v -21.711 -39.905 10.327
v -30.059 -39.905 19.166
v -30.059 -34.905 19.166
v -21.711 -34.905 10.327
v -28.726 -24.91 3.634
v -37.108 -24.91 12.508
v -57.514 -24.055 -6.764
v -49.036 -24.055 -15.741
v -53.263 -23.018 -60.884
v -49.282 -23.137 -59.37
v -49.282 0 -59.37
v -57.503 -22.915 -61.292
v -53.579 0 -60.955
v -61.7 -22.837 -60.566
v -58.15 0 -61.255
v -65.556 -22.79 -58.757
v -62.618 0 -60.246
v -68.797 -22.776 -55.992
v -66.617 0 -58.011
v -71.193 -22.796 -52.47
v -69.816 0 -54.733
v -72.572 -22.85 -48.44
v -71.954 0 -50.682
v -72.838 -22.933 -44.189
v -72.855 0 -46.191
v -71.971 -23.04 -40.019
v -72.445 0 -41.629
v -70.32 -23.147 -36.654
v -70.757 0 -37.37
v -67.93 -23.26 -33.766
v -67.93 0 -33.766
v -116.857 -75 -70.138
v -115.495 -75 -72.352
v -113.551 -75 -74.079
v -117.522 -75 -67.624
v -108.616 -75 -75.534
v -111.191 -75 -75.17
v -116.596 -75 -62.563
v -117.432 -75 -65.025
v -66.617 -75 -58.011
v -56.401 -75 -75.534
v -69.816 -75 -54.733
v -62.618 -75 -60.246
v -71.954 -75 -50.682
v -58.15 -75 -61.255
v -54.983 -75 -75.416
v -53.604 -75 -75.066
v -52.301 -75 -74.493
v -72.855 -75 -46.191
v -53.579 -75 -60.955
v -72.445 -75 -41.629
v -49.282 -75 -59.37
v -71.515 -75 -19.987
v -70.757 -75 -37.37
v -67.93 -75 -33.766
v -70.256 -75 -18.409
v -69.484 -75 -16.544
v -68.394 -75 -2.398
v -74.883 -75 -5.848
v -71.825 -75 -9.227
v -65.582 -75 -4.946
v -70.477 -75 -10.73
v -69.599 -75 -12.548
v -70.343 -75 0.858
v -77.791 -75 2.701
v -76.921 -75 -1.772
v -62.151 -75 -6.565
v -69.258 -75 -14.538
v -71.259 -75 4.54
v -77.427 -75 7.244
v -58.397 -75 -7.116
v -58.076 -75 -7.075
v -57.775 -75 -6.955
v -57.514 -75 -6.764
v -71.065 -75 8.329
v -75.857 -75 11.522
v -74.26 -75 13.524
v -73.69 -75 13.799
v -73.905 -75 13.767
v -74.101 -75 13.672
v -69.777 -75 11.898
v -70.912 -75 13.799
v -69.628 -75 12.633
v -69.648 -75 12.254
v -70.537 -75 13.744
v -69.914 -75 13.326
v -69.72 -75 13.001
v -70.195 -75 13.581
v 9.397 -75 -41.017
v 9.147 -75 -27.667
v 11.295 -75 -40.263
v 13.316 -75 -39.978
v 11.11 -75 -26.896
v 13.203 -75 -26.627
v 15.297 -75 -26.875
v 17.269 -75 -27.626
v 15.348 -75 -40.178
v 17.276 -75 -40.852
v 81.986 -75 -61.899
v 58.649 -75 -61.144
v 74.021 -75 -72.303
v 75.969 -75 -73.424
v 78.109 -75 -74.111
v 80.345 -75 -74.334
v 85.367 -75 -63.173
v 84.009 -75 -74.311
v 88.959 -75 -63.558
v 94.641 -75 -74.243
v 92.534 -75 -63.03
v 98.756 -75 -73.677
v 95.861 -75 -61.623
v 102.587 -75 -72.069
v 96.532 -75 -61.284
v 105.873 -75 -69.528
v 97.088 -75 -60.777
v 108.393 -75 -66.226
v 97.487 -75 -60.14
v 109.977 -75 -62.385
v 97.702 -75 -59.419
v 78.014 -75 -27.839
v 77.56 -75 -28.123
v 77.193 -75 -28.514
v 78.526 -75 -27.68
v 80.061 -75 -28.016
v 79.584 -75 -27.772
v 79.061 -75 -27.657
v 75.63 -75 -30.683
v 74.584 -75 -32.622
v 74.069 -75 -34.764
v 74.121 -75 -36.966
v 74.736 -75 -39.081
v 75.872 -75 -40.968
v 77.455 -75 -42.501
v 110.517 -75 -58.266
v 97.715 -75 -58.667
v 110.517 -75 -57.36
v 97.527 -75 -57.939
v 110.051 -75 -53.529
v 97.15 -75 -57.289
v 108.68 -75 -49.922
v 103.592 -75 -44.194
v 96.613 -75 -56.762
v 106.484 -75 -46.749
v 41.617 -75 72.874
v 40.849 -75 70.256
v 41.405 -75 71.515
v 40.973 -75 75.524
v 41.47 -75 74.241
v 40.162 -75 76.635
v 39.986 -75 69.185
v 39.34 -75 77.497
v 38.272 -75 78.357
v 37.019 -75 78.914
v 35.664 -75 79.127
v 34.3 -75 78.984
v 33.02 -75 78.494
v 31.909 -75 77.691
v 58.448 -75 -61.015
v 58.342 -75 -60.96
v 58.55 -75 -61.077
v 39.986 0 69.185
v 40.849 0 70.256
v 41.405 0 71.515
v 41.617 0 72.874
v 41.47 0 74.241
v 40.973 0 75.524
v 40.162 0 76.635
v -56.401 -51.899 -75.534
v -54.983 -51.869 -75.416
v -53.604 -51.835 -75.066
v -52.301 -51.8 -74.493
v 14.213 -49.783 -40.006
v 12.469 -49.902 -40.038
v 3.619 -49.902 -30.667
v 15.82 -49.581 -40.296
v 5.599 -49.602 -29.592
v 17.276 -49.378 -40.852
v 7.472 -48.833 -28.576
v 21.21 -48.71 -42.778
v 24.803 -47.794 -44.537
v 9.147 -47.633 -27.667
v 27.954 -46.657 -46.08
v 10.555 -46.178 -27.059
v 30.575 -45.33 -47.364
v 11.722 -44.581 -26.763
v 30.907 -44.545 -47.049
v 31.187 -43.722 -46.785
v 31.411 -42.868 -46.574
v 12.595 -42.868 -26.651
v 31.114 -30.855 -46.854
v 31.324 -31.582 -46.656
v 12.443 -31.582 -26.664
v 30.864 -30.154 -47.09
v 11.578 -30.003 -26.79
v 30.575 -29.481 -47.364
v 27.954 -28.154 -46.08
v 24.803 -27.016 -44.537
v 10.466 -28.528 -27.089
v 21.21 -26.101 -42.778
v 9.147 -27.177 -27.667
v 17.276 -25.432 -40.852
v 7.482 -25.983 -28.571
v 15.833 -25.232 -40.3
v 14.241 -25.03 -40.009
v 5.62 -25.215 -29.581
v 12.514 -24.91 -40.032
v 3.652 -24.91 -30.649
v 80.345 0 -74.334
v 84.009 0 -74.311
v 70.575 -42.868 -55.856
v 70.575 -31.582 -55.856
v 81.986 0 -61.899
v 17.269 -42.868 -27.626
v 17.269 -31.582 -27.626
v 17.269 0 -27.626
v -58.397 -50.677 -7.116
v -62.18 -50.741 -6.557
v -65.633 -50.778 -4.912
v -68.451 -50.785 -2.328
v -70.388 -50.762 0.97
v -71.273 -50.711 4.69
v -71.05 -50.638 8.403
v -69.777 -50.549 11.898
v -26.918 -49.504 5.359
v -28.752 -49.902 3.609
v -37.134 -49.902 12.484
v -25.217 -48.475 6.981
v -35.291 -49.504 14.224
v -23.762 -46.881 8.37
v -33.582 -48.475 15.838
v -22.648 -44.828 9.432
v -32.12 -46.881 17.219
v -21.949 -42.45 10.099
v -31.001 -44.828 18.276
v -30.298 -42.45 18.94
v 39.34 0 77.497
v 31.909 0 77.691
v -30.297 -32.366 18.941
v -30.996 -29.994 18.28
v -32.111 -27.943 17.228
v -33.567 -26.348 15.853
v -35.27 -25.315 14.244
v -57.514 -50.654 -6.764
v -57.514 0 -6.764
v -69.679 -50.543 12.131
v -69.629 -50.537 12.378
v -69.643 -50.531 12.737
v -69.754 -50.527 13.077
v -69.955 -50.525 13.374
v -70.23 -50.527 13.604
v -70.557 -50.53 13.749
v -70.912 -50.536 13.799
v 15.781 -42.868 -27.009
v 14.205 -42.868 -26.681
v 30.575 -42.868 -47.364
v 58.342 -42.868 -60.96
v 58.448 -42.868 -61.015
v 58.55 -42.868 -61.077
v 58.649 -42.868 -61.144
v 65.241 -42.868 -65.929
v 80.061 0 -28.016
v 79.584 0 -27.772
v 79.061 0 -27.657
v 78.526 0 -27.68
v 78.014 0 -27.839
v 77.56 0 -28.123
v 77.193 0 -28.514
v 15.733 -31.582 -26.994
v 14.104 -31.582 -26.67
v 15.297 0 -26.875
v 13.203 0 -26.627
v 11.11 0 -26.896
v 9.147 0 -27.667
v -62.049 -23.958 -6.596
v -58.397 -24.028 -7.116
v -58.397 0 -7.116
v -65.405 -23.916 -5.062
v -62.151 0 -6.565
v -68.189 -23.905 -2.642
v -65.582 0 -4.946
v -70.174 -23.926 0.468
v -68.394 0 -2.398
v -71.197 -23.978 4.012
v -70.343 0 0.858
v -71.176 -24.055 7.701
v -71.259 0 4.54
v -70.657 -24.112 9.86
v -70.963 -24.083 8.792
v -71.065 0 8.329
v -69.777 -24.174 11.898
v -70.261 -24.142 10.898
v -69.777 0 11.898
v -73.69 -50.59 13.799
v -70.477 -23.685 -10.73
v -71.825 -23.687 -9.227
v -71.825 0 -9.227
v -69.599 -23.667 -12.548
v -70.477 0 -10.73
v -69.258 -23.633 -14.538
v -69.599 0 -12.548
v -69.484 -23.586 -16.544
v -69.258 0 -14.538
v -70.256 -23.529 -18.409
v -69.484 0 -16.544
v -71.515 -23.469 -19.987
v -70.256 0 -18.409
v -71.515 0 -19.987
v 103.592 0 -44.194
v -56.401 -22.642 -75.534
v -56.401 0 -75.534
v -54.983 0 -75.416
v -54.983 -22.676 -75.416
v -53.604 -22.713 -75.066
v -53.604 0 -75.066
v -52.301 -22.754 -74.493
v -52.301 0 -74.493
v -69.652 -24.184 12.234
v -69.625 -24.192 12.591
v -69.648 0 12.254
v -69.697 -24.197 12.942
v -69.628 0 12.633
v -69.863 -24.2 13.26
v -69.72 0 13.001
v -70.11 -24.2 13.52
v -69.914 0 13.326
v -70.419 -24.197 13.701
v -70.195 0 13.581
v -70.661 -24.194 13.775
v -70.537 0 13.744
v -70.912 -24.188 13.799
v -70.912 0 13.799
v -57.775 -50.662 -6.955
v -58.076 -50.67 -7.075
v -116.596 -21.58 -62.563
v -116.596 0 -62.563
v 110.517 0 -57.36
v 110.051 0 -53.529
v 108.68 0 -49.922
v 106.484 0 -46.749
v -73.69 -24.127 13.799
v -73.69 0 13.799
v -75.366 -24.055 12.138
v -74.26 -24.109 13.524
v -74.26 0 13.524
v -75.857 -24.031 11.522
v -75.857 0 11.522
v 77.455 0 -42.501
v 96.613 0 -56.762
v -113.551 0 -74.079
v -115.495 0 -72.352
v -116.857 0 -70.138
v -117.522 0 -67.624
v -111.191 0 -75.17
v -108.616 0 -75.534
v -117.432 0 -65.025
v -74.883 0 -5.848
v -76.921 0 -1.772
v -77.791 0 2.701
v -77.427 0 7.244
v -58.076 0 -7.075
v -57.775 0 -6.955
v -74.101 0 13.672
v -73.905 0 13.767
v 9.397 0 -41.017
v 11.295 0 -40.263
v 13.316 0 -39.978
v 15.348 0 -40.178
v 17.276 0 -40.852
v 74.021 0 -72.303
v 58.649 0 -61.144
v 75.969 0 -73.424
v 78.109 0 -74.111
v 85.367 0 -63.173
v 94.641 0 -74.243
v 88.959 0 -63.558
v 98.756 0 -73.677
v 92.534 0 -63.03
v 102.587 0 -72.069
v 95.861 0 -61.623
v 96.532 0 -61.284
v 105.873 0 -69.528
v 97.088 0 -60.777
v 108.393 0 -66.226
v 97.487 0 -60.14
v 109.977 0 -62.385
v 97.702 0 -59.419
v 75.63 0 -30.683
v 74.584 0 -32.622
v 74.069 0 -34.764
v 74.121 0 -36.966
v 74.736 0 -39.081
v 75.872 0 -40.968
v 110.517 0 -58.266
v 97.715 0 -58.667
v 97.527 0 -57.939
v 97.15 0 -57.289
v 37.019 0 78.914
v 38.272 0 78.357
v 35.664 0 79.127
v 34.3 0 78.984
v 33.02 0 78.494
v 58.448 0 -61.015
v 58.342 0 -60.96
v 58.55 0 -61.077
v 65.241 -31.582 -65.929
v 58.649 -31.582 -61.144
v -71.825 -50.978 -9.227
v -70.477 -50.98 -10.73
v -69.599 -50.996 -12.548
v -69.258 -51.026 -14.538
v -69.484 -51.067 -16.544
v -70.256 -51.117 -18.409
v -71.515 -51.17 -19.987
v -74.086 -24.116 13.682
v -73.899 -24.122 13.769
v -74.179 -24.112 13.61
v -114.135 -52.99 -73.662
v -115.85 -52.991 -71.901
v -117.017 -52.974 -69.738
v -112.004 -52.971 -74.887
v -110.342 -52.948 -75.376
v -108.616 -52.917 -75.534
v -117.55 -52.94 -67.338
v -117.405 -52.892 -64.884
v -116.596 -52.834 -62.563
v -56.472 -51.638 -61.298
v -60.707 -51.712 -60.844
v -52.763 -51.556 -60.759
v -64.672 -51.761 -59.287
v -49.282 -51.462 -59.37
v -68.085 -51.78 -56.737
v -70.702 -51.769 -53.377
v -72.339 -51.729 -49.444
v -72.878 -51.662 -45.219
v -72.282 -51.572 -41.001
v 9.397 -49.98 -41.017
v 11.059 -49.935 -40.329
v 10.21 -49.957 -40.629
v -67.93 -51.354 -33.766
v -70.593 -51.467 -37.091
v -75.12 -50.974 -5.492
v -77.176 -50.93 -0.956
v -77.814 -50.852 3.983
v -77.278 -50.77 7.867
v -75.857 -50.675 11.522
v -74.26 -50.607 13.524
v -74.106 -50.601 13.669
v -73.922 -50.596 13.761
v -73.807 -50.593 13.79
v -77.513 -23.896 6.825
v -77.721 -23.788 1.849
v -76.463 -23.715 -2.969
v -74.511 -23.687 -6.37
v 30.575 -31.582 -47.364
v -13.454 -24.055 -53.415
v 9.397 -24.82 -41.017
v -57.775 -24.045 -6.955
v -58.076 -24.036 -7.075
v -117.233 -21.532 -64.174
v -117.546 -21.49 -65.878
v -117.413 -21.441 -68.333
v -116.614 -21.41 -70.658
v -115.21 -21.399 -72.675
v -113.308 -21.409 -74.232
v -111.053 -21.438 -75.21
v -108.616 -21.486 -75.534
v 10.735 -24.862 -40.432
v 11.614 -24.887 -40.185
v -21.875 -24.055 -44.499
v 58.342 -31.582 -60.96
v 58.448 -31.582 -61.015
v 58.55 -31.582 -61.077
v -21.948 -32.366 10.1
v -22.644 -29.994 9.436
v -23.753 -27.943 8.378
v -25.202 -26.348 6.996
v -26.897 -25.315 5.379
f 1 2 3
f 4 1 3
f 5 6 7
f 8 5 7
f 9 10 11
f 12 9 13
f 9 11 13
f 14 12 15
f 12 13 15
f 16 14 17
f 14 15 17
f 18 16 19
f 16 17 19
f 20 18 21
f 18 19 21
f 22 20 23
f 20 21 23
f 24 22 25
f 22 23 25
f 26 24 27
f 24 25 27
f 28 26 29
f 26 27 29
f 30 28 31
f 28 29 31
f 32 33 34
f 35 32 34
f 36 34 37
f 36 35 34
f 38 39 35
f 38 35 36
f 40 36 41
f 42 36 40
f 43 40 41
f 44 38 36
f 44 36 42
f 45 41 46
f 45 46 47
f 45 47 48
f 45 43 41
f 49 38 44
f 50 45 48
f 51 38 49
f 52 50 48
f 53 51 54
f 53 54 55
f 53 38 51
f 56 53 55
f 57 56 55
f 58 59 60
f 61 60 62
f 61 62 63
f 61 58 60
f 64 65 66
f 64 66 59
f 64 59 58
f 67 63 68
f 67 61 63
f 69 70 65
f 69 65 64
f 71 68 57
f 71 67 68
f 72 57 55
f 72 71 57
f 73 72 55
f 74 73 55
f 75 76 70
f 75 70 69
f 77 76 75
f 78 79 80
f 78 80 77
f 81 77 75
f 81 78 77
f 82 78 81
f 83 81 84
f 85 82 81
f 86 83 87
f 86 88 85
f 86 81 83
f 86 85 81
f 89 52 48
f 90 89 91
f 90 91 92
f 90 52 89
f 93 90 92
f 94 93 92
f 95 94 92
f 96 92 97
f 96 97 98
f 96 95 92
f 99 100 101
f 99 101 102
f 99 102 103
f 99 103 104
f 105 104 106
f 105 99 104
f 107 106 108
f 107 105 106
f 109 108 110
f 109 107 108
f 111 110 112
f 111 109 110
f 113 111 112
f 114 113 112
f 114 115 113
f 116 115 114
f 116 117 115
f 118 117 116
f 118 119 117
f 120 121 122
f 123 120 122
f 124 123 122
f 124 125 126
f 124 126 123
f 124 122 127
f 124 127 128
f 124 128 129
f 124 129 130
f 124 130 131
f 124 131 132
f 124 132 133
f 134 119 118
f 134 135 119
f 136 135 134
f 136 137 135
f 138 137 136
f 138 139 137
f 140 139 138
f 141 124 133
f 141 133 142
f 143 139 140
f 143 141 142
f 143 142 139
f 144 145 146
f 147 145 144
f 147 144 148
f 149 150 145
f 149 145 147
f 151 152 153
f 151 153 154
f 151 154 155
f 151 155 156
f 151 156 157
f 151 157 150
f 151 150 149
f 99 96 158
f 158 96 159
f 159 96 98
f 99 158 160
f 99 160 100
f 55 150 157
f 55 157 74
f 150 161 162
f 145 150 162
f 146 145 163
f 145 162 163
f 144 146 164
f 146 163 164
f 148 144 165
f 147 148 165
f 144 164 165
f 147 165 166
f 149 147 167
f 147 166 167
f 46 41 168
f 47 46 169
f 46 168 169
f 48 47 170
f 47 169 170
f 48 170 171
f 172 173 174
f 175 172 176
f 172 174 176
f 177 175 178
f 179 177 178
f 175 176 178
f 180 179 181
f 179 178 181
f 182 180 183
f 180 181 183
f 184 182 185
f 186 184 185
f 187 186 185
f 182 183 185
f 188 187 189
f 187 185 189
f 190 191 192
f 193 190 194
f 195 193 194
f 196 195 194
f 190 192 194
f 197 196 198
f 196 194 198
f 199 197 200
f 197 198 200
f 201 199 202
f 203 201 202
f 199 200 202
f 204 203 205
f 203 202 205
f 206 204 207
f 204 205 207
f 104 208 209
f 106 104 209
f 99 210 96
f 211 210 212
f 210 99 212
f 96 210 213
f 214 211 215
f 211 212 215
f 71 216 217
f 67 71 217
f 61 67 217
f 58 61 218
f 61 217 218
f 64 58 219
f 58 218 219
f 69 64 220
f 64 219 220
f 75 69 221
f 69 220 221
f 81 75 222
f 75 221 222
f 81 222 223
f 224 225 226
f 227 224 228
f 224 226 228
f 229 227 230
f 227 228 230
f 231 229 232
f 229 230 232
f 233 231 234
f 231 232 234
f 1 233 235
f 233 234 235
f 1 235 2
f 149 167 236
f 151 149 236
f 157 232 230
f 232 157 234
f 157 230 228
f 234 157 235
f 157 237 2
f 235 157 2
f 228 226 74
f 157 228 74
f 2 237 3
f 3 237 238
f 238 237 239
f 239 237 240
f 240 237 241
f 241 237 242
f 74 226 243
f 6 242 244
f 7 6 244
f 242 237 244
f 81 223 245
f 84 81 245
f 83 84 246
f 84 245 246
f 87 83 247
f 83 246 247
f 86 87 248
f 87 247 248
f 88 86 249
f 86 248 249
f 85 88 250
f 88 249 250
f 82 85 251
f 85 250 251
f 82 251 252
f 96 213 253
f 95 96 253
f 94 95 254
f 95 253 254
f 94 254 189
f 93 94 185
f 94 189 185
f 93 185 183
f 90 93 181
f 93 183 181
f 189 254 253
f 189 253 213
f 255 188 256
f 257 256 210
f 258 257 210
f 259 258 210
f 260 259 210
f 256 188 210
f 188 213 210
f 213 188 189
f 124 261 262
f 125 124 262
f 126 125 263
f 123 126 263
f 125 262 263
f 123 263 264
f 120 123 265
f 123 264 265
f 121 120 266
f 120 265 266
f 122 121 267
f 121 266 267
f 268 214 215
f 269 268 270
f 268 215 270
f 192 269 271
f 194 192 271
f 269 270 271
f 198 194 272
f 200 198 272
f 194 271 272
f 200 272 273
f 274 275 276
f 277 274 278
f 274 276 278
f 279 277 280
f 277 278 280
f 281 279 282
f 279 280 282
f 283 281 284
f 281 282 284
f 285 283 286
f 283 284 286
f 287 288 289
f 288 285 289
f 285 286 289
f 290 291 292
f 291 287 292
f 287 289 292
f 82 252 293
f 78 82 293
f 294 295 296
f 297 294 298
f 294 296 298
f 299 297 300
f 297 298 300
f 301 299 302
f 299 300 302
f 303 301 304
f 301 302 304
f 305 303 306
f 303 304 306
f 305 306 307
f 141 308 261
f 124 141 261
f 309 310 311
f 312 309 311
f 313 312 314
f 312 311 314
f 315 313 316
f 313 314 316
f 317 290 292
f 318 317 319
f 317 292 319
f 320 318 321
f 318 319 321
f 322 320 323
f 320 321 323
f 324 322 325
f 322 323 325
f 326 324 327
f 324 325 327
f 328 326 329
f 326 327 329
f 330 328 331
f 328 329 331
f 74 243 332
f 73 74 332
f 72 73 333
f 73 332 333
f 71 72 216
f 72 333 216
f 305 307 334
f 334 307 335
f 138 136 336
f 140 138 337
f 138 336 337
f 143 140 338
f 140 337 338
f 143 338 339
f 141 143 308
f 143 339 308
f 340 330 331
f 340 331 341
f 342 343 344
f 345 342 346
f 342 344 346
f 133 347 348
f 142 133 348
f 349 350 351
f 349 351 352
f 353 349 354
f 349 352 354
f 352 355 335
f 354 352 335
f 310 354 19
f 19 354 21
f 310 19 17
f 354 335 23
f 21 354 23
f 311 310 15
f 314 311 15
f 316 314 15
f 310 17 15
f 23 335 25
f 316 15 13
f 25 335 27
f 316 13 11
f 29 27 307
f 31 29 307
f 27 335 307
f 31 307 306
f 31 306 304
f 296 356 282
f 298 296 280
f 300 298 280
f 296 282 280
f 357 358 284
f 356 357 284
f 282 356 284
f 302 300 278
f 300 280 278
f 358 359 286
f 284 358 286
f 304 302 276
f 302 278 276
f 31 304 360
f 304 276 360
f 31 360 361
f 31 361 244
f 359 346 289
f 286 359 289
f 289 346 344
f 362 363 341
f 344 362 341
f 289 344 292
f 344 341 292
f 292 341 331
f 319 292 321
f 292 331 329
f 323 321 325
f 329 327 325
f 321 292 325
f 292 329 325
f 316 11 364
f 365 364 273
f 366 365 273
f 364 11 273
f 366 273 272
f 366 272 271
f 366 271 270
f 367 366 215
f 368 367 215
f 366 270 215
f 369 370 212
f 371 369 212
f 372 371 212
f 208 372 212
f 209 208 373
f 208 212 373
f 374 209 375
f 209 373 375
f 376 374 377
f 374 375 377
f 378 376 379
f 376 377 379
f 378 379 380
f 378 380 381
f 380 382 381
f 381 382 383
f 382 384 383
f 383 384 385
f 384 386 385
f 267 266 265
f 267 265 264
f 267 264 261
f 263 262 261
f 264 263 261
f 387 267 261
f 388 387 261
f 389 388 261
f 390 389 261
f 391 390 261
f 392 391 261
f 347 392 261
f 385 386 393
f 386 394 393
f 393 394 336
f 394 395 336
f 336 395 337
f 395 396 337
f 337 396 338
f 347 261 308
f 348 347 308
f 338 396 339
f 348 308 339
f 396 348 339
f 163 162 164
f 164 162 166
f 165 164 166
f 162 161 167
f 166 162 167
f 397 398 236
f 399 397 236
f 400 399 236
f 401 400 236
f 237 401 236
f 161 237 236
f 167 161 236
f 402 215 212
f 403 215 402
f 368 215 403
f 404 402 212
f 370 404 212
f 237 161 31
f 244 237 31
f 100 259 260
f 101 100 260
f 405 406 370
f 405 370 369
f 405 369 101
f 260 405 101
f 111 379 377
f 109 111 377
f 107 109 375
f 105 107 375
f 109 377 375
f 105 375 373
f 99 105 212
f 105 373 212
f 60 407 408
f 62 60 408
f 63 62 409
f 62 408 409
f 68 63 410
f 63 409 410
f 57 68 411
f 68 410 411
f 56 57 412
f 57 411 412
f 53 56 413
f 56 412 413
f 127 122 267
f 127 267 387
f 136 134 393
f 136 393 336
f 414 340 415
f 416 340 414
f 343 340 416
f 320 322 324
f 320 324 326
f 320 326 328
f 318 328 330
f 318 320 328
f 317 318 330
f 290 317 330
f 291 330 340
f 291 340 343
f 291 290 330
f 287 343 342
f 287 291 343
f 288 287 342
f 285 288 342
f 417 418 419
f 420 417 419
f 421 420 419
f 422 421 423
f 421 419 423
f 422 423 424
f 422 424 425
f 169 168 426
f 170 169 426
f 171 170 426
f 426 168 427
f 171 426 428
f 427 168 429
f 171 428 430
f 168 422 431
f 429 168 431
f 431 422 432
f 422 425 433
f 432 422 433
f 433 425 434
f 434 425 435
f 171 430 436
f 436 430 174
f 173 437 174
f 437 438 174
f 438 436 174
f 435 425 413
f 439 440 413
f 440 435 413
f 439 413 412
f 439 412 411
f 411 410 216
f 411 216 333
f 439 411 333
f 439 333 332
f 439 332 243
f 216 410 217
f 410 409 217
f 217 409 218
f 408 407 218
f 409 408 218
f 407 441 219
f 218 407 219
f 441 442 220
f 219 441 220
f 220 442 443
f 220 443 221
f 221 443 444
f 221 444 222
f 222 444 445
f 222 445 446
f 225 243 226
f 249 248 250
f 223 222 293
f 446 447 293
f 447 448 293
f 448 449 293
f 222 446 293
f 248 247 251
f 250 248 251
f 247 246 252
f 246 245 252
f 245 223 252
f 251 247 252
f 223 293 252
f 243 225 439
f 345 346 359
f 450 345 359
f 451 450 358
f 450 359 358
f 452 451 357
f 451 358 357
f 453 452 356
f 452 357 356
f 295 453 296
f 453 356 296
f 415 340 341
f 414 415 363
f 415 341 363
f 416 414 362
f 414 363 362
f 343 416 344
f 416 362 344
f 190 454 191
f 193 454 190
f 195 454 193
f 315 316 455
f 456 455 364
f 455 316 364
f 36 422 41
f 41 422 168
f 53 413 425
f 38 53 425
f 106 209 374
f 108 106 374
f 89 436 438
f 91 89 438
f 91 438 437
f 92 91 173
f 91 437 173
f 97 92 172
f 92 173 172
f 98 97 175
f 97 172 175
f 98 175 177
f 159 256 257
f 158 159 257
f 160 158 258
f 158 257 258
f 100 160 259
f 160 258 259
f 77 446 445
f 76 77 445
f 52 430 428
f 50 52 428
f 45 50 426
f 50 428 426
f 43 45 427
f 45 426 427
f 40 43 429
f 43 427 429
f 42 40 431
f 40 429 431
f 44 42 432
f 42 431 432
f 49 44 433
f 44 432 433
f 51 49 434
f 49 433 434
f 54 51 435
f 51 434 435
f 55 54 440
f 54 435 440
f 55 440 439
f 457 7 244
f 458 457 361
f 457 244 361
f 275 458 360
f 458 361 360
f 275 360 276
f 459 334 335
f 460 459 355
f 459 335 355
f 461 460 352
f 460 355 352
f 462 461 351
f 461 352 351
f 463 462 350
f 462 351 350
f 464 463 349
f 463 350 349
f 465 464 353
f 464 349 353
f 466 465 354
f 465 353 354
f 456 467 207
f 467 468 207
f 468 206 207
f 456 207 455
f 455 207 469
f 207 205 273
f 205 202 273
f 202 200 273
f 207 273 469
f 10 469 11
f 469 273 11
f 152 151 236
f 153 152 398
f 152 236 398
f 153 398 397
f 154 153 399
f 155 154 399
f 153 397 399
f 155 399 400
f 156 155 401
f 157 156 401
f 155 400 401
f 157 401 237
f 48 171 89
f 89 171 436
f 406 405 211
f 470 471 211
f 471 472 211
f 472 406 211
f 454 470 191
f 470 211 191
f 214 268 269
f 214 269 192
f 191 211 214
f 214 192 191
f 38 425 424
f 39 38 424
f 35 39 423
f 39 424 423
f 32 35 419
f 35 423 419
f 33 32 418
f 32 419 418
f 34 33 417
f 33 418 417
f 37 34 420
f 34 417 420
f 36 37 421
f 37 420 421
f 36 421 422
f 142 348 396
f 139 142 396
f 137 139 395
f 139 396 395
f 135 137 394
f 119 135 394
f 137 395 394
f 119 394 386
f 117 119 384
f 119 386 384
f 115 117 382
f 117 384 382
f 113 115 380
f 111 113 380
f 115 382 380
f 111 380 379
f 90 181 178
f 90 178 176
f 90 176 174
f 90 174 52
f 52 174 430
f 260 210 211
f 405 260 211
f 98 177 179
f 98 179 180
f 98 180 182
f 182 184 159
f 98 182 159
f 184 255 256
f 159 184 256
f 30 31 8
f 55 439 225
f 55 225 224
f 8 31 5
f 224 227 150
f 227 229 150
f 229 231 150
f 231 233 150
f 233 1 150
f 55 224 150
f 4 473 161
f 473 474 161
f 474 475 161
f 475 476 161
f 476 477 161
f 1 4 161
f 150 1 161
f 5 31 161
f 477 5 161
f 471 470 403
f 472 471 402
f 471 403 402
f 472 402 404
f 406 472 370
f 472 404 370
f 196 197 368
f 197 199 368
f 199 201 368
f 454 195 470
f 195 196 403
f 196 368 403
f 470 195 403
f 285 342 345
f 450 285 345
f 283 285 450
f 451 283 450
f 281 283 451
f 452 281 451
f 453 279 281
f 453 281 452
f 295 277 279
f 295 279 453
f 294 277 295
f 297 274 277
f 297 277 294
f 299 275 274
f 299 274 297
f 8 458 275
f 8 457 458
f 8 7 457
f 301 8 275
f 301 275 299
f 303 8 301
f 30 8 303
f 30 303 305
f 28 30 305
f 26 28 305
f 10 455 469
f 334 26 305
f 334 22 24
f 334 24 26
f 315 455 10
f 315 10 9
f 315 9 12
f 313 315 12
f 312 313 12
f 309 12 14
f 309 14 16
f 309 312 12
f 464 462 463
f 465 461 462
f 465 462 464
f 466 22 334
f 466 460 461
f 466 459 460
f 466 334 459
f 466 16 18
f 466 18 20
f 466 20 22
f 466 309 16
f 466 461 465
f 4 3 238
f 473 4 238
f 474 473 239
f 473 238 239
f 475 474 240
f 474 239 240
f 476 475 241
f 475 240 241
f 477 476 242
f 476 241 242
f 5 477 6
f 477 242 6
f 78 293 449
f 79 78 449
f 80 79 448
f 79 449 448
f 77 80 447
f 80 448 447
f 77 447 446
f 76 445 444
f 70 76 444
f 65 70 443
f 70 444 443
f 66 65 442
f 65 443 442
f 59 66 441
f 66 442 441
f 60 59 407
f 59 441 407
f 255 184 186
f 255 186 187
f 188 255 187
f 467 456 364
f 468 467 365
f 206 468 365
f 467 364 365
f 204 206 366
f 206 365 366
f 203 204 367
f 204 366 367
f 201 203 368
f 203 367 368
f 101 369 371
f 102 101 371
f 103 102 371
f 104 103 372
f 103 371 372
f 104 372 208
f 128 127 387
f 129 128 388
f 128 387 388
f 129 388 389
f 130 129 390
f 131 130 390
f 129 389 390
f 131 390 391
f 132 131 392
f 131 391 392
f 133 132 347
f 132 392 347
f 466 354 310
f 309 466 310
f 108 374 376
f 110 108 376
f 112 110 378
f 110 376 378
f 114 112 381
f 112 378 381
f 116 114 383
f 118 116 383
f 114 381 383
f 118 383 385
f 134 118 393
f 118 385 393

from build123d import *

# Parameters (mm, degrees)
F1_DEPTH      = 75
F3_DEPTH      = 30
F3_DEPTH_BACK = 90
F4_W          = 60.3201809678
F4_H          = 11.285925284
F5_DEPTH      = 25
F5_DEPTH_BACK = 10


with BuildPart() as f1:
    # F0 (on Front) → F1 (new body)
    with BuildSketch(Plane.XZ):
        with BuildLine():
            Line((31.9086386453, 77.6905462364), (-57.5139995569, -6.7641266773))
            ThreePointArc((-57.5139995569, -6.7641266773), (-57.9219339607, -7.0245091068), (-58.3971183008, -7.1162115075))
            ThreePointArc((-58.3971183008, -7.1162115075), (-69.4887089259, -0.8420637784), (-69.7767442137, 11.8978478381))
            ThreePointArc((-69.7767442137, 11.8978478381), (-69.8049165196, 13.1707831552), (-70.9122465225, 13.7992561182))
            Line((-70.9122465225, 13.7992561182), (-73.6895077641, 13.7992561182))
            ThreePointArc((-73.6895077641, 13.7992561182), (-74.0062961207, 13.726942606), (-74.2603264098, 13.5243278998))
            Line((-74.2603264098, 13.5243278998), (-75.8568685996, 11.5219015441))
            ThreePointArc((-75.8568685996, 11.5219015441), (-77.5081657489, 0.4349594479), (-71.8249073519, -9.226698863))
            ThreePointArc((-71.8249073519, -9.226698863), (-69.2584995586, -14.5376929324), (-71.5152183851, -19.9874935806))
            Line((-71.5152183851, -19.9874935806), (-116.5955893061, -62.5633788748))
            ThreePointArc((-116.5955893061, -62.5633788748), (-116.2574535182, -71.2949238612), (-108.6162978034, -75.5336681331))
            Line((-108.6162978034, -75.5336681331), (-56.4006080373, -75.5336681323))
            ThreePointArc((-56.4006080373, -75.5336681323), (-54.2860073929, -75.2694967603), (-52.3013870442, -74.4932207332))
            Line((-52.3013870442, -74.4932207332), (9.3968417232, -41.0165915738))
            ThreePointArc((9.3968417232, -41.0165915738), (13.3164182298, -39.9780216691), (17.2759733413, -40.8518813589))
            Line((17.2759733413, -40.8518813589), (58.3416101428, -60.9595264103))
            ThreePointArc((58.3416101428, -60.9595264103), (58.4992740431, -61.0453458085), (58.6489560893, -61.1444324351))
            Line((58.6489560893, -61.1444324351), (74.0206310135, -72.3025880245))
            ThreePointArc((74.0206310135, -72.3025880245), (77.0205825857, -73.8239393845), (80.345354257, -74.3339518648))
            Line((80.345354257, -74.3339518648), (84.008830193, -74.3106924806))
            Line((84.008830193, -74.3106924806), (94.6409664598, -74.2431891184))
            ThreePointArc((94.6409664598, -74.2431891184), (105.8729254369, -69.5279758333), (110.516733495, -58.2663069736))
            Line((110.516733495, -58.2663069736), (110.516733495, -57.3599657599))
            ThreePointArc((110.516733495, -57.3599657599), (108.6798338491, -49.9220331846), (103.5915117273, -44.1943792767))
            Line((103.5915117273, -44.1943792767), (80.0608191671, -28.0158812776))
            ThreePointArc((80.0608191671, -28.0158812776), (78.5255862483, -27.6803464363), (77.1934165925, -28.5139217195))
            Line((77.1934165925, -28.5139217195), (75.6298542432, -30.6832325702))
            ThreePointArc((75.6298542432, -30.6832325702), (74.1211917974, -36.9659668973), (77.4545705219, -42.5010729739))
            Line((77.4545705219, -42.5010729739), (96.61347436, -56.7622144645))
            ThreePointArc((96.61347436, -56.7622144645), (97.7016607764, -59.4192137179), (95.8614861172, -61.6231991836))
            ThreePointArc((95.8614861172, -61.6231991836), (88.9594846076, -63.5579741018), (81.9860902339, -61.8988328387))
            Line((81.9860902339, -61.8988328387), (17.2686592302, -27.626202898))
            ThreePointArc((17.2686592302, -27.626202898), (13.2025716128, -26.6269144318), (9.1467925766, -27.6672520504))
            Line((9.1467925766, -27.6672520504), (-49.2817682282, -59.3698033465))
            ThreePointArc((-49.2817682282, -59.3698033465), (-69.8161964781, -54.7329590263), (-67.9299516201, -33.7661960635))
            Line((-67.9299516201, -33.7661960635), (39.9862620913, 69.185022562))
            ThreePointArc((39.9862620913, 69.185022562), (41.616957342, 72.8737890727), (40.1616811978, 76.6352165564))
            Line((40.1616811978, 76.6352165564), (39.3396363558, 77.4969058889))
            ThreePointArc((39.3396363558, 77.4969058889), (35.6640993707, 79.1272730212), (31.9086386453, 77.6905462364))
        make_face()
    extrude(amount=F1_DEPTH)

    # F2 (on face) → F3 (cut, two sides)
    with BuildSketch(Plane(origin=(-23.7385230795, 0, 25.1349189755), x_dir=(0.7270133187, 0, 0.686623357), z_dir=(-0.686623357, 0, 0.7270133187))) as f3_sk:
        Polygon((-46.4578510571, -24.0551400103), (-143.9990401268, -21.0843849927), (-143.4555607145, -53.2556629783), (-46.4578510571, -50.6537381076), align=None)
        with BuildLine():
            Line((-18.389185364, -24.9100109652), (-46.4578510571, -24.0551400103))
            Line((-46.4578510571, -24.0551400103), (-46.4578510571, -50.6537381076))
            Line((-46.4578510571, -50.6537381076), (-18.4254588112, -49.9017803673))
            ThreePointArc((-18.4254588112, -49.9017803673), (-11.5283625374, -46.8809946351), (-8.6936083649, -39.905376223))
            Line((-8.6936083649, -39.905376223), (-8.6936083649, -34.905376223))
            ThreePointArc((-8.6936083649, -34.905376223), (-11.5157176577, -27.9427700303), (-18.389185364, -24.9100109652))
        make_face()
    extrude(amount=F3_DEPTH, mode=Mode.SUBTRACT)
    extrude(f3_sk.sketch, amount=-F3_DEPTH_BACK, mode=Mode.SUBTRACT)

    # F4 (on face) → F5 (cut, two sides)
    with BuildSketch(Plane(origin=(-7.6435291417, 0, -14.433370614), x_dir=(0.8837288425, 0, -0.4679992873), z_dir=(0.4679992873, 0, 0.8837288425))) as f5_sk:
        with Locations((58.3499459846, -37.2247295454)):
            Rectangle(F4_W, F4_H)
        with BuildLine():
            ThreePointArc((3.452683799, -39.8676921874), (4.3313634554, -41.989012531), (6.452683799, -42.8676921874))
            Line((6.452683799, -42.8676921874), (28.1898555007, -42.8676921874))
            Line((28.1898555007, -42.8676921874), (28.1898555007, -31.5817669034))
            Line((28.1898555007, -31.5817669034), (6.452683799, -31.5817669034))
            ThreePointArc((6.452683799, -31.5817669034), (4.3313634554, -32.4604465598), (3.452683799, -34.5817669034))
            Line((3.452683799, -34.5817669034), (3.452683799, -39.8676921874))
        make_face()
    extrude(amount=-F5_DEPTH, mode=Mode.SUBTRACT)
    extrude(f5_sk.sketch, amount=F5_DEPTH_BACK, mode=Mode.SUBTRACT)


solid = f1.part
